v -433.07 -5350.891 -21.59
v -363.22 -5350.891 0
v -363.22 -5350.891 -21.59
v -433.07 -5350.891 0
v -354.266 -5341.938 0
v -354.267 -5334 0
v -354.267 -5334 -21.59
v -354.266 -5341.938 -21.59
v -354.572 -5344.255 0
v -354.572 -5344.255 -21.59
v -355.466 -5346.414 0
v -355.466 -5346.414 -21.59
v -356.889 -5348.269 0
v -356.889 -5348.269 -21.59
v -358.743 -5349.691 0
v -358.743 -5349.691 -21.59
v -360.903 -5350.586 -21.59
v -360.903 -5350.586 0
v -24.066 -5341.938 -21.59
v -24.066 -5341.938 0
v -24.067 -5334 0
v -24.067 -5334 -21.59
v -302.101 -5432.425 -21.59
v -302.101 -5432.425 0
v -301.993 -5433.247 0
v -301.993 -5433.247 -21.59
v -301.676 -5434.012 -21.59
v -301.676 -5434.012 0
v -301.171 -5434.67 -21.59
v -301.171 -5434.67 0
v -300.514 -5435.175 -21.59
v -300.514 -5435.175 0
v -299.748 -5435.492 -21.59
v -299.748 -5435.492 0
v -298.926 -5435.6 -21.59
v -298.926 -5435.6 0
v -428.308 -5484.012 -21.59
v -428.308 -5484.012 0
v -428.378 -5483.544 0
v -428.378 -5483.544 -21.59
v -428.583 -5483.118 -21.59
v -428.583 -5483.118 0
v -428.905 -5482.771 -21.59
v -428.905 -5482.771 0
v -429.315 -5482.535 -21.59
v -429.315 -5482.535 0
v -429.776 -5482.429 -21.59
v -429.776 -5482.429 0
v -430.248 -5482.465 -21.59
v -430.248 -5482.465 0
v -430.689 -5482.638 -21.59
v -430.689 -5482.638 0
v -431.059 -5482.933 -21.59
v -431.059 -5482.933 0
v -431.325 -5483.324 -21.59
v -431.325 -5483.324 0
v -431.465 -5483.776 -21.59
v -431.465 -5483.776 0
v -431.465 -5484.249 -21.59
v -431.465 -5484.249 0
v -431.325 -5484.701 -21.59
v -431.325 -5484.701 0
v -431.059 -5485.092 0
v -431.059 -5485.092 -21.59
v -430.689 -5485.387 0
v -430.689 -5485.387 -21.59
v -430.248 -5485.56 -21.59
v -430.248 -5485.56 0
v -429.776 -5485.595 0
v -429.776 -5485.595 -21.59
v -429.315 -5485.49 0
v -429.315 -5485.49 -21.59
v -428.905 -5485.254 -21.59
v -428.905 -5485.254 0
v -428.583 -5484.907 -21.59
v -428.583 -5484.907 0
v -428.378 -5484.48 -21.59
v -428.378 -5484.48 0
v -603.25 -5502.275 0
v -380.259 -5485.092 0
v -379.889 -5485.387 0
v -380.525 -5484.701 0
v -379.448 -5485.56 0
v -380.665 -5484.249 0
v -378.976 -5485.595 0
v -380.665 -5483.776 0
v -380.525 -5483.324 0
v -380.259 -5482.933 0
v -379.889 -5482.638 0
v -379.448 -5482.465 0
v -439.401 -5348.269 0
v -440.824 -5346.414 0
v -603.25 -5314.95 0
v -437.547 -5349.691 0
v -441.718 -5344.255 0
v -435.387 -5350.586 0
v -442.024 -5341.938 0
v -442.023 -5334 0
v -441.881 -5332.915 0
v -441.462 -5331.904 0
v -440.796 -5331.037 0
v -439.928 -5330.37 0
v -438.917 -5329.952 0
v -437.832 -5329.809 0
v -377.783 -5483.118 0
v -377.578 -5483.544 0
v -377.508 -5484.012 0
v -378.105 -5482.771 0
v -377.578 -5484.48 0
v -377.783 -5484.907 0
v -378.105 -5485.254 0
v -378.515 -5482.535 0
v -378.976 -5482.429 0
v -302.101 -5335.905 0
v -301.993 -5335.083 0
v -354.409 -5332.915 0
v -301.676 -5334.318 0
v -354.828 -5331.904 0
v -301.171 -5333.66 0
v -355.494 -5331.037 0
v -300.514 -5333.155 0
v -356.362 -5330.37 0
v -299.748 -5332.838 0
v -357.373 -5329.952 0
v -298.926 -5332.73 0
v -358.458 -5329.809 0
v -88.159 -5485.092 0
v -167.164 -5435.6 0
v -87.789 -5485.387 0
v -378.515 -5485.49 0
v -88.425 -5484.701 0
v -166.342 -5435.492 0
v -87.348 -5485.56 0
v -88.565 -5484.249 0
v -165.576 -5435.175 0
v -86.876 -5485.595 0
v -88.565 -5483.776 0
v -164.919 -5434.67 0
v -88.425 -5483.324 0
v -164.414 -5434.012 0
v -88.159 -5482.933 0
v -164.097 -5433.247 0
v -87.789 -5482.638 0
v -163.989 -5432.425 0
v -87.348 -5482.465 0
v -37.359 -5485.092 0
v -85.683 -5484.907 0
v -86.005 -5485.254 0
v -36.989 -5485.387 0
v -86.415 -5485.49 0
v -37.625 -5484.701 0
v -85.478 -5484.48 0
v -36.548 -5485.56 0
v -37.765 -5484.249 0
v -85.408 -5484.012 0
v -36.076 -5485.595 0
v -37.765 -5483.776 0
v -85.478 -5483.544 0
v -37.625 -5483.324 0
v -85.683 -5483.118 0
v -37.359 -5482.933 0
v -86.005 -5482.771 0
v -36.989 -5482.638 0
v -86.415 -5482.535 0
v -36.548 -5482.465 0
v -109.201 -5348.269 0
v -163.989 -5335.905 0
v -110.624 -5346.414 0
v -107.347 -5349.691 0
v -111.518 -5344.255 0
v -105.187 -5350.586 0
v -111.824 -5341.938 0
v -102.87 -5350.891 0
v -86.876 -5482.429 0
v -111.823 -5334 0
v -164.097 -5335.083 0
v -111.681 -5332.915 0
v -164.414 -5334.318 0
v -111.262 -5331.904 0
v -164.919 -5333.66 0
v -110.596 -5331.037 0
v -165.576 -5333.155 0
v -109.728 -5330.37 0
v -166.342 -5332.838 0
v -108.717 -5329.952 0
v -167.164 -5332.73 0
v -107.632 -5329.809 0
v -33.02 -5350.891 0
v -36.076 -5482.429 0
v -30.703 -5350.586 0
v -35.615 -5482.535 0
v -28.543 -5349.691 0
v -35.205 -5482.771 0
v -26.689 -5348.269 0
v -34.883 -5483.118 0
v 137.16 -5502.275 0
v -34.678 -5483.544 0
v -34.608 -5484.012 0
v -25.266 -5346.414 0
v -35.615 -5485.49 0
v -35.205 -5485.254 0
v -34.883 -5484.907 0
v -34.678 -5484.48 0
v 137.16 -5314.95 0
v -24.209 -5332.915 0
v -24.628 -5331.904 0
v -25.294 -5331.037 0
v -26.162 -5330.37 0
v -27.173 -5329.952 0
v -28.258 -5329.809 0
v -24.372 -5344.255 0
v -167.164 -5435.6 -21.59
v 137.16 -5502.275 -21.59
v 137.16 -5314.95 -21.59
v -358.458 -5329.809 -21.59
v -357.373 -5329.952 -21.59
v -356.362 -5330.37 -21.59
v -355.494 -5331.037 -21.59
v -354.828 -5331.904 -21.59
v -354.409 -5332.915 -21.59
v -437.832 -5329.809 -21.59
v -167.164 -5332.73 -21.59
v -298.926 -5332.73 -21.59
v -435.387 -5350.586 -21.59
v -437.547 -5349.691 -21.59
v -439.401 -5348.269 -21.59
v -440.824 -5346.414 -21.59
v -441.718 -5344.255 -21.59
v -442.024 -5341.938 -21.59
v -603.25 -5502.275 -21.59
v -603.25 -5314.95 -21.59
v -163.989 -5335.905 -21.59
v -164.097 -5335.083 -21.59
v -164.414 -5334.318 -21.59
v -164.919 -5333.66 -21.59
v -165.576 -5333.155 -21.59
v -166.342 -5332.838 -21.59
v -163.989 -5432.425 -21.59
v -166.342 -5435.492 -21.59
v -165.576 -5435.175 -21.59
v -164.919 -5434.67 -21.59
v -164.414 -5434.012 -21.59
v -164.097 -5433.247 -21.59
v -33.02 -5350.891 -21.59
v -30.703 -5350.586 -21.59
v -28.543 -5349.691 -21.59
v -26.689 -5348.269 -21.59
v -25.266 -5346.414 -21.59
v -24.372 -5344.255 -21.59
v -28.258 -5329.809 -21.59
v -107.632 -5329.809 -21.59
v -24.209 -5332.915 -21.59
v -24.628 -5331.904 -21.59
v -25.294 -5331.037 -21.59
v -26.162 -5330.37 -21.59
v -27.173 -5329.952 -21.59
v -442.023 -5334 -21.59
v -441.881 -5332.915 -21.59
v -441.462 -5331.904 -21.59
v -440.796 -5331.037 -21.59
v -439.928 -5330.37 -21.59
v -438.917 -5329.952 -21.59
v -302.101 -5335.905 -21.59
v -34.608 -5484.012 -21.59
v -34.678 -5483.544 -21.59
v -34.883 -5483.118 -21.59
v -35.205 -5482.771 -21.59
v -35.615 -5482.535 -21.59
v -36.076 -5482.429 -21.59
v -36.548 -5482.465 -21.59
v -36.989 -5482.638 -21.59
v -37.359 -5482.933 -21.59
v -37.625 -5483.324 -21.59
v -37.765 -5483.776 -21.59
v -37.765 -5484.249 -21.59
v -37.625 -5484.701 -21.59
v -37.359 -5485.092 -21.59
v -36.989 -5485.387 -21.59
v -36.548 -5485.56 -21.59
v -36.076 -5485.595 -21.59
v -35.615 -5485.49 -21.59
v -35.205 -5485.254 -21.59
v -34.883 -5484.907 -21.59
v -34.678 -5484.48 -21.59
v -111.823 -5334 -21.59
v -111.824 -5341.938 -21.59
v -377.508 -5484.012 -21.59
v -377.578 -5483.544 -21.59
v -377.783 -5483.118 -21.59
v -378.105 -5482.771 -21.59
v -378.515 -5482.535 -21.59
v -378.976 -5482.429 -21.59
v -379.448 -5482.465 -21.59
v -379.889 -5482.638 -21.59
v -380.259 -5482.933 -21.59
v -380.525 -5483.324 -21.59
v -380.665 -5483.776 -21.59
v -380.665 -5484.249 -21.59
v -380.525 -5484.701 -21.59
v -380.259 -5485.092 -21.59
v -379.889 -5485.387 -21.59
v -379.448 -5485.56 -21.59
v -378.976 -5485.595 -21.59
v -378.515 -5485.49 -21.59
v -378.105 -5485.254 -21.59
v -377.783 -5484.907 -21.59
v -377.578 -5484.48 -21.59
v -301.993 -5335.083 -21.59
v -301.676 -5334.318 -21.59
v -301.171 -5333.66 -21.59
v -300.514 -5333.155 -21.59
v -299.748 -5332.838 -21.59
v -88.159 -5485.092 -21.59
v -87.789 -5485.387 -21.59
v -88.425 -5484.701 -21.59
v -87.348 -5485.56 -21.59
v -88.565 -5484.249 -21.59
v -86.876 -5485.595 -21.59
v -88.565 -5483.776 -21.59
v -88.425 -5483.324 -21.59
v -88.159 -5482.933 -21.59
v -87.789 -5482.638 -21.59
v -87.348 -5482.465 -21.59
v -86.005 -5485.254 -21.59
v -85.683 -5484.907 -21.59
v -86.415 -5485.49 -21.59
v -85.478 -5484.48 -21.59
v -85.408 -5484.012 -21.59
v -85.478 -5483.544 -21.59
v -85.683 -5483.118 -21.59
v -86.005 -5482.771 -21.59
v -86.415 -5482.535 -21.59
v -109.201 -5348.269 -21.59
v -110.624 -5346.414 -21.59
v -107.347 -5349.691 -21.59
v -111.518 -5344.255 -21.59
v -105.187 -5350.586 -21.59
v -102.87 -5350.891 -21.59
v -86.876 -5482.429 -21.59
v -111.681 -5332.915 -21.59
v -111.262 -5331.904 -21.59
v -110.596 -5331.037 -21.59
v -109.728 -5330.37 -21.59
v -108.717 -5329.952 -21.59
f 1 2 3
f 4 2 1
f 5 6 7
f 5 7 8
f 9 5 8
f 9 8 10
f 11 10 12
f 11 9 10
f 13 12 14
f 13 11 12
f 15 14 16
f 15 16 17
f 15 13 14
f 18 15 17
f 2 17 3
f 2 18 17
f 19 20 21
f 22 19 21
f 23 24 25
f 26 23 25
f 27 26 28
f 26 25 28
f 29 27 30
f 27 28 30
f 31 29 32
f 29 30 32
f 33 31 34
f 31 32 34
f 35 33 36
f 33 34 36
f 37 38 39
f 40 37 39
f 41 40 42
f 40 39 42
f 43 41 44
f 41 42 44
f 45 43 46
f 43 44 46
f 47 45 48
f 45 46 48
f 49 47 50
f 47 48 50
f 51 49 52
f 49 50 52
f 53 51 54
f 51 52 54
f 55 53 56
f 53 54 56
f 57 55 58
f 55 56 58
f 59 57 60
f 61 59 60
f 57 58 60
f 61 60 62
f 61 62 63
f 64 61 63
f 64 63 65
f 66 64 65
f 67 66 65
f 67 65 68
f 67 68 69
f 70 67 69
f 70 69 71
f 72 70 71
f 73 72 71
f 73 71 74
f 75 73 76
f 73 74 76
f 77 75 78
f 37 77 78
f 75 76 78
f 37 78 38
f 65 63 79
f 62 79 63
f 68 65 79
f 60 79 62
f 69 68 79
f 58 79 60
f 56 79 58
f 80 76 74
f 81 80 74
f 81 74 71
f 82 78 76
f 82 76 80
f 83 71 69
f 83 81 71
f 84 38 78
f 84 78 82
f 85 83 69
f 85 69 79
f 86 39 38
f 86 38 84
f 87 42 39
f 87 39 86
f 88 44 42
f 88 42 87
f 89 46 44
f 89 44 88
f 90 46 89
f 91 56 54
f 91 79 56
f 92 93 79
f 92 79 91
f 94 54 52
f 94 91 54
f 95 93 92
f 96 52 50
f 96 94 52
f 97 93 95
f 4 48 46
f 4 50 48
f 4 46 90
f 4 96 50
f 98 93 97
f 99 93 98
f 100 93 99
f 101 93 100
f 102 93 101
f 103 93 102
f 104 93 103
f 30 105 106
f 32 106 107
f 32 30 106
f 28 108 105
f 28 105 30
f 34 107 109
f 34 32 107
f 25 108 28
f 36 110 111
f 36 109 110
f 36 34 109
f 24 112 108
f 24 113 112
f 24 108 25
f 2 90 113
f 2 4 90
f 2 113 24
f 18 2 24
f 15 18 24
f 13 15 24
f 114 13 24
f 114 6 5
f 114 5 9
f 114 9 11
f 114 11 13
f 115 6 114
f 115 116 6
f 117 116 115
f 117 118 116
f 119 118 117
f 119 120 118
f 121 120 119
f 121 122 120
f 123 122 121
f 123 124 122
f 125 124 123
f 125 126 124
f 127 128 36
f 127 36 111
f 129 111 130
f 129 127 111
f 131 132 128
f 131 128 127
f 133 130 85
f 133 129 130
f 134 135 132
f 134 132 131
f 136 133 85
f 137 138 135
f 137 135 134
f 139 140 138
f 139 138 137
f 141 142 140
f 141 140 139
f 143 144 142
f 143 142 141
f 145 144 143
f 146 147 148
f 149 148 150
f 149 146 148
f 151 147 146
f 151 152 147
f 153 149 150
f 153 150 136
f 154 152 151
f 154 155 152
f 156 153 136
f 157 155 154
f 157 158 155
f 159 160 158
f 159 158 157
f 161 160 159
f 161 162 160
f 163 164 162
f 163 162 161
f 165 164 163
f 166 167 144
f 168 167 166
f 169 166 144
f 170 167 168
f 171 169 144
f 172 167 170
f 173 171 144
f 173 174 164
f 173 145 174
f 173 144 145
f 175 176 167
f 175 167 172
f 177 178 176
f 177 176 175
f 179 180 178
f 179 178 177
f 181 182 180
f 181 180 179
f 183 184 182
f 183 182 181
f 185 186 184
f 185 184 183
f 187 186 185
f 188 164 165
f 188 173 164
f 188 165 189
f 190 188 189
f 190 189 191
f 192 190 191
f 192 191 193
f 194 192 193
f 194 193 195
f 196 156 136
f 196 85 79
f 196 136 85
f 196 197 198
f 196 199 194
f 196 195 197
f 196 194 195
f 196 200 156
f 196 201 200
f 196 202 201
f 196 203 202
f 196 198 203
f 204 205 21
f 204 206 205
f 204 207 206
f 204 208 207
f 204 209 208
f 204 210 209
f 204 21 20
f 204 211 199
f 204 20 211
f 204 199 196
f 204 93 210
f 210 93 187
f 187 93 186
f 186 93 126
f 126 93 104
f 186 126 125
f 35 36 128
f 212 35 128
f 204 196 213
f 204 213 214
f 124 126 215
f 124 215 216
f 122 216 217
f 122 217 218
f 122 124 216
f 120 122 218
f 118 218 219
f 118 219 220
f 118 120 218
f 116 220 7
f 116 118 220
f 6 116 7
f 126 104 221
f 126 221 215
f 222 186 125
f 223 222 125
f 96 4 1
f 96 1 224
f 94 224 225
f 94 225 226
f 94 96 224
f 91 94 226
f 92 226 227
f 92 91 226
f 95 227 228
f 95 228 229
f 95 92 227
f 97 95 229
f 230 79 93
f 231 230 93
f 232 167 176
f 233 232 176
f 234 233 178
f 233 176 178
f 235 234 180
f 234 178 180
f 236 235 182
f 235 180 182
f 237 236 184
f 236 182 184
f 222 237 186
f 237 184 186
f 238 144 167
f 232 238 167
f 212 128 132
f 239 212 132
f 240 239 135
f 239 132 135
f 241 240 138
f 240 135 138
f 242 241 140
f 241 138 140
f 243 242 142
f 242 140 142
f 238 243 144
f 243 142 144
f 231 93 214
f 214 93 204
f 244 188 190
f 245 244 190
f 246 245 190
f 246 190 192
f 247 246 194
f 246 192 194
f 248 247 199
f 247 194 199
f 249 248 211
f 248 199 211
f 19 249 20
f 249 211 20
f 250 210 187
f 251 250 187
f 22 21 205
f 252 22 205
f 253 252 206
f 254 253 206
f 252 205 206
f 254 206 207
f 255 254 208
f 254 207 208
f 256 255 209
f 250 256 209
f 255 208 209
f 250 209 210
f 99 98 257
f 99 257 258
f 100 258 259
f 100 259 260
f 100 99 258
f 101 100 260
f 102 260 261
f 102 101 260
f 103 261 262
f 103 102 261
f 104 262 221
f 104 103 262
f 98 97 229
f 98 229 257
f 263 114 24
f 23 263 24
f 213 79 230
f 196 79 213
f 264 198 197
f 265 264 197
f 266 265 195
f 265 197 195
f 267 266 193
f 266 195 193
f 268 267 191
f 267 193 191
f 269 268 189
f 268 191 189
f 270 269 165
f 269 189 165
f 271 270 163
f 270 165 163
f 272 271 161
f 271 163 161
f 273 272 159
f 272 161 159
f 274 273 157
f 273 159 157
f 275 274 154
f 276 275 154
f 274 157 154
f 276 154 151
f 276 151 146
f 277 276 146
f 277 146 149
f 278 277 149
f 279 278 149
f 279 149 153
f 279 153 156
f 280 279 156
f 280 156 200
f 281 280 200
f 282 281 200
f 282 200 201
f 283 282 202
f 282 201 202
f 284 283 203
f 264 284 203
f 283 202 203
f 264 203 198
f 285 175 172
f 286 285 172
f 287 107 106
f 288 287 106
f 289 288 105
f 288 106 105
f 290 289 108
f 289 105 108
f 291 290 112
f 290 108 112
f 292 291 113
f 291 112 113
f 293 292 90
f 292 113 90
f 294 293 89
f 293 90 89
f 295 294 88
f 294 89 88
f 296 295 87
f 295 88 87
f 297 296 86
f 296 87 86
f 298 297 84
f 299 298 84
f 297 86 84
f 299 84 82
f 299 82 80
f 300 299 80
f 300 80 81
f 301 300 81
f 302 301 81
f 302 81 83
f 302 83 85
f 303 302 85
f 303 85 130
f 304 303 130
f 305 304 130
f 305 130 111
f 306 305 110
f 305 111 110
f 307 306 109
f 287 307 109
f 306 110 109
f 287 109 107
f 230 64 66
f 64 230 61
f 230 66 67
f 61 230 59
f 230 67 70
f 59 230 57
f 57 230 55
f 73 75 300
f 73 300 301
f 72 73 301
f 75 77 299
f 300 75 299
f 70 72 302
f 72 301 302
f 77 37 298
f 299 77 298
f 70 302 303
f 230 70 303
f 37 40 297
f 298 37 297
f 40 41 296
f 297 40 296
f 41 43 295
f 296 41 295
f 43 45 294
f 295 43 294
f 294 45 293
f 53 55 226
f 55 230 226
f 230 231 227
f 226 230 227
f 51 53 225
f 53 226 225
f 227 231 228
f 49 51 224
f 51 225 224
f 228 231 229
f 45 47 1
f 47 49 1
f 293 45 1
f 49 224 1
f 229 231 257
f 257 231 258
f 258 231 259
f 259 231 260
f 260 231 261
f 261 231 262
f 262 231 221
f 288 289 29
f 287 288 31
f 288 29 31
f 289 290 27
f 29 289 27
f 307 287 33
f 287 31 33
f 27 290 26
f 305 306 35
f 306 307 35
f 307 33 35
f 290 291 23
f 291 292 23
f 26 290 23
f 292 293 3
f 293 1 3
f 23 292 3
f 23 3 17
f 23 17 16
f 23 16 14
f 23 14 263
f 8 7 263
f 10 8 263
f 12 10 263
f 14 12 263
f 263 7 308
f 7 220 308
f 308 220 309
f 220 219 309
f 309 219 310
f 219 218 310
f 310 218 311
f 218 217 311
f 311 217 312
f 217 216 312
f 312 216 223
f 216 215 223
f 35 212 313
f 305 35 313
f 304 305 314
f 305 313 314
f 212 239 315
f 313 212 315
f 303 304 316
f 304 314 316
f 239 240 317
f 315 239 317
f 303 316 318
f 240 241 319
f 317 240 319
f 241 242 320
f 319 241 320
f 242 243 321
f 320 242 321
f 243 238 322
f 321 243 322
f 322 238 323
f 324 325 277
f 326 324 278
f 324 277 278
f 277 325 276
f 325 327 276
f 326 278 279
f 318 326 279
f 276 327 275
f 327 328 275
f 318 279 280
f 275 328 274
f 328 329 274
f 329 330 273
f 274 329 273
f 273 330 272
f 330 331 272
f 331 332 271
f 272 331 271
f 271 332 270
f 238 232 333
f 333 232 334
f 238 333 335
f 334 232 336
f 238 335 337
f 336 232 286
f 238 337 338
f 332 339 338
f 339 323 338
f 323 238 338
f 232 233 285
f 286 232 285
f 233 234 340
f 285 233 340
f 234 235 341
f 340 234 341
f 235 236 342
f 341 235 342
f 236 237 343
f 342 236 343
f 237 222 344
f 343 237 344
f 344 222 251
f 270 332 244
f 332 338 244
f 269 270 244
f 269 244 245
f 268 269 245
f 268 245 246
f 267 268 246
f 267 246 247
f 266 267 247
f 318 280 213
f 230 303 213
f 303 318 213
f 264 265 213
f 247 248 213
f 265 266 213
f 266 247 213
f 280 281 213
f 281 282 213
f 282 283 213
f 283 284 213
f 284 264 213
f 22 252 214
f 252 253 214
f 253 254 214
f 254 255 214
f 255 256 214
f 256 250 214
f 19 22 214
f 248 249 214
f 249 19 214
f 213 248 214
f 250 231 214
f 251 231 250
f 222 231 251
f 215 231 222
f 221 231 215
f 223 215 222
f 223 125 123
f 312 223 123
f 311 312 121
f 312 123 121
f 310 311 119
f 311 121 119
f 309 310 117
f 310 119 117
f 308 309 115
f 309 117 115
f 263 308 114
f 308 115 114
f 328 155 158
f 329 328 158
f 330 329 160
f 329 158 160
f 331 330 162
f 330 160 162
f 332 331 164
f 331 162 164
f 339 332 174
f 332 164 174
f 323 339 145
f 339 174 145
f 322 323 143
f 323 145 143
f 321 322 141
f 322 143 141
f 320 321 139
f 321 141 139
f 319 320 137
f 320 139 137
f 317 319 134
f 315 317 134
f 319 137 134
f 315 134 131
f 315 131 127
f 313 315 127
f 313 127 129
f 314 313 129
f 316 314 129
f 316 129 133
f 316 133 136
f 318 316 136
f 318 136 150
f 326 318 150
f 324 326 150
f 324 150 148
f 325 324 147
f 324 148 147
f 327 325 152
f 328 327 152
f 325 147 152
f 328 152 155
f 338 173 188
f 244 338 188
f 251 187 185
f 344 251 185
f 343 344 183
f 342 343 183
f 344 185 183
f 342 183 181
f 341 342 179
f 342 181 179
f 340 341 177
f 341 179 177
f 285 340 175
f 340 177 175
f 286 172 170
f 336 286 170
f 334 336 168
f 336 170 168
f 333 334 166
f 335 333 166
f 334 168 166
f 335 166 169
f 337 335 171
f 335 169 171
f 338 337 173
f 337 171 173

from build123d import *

# Parameters (mm, degrees)
SKETCH2_W          = 740.41
SKETCH2_H          = 187.325
EXTRUDE1_DEPTH     = 21.59
SKETCH3_R          = 1.5875
CUT_EXTRUDE1_DEPTH = 21.59


with BuildPart() as part:
    # Sketch2 → Extrude1 (new body)
    with BuildSketch(Plane.XY):
        with Locations((-233.045, -5408.6125)):
            Rectangle(SKETCH2_W, SKETCH2_H)
    extrude(amount=-EXTRUDE1_DEPTH)

    # Sketch3 → Cut-Extrude1 (cut)
    with BuildSketch(Plane.XY):
        with Locations((-429.895, -5484.0124)):
            Circle(SKETCH3_R)
        with Locations((-379.095, -5484.0124)):
            Circle(SKETCH3_R)
        with Locations((-86.995, -5484.0124)):
            Circle(SKETCH3_R)
        with Locations((-36.195, -5484.0124)):
            Circle(SKETCH3_R)
        with BuildLine():
            Line((-302.10125, -5335.905), (-302.10125, -5432.425))
            ThreePointArc((-302.10125, -5432.425), (-301.17131403, -5434.67006403), (-298.92625, -5435.6))
            Line((-298.92625, -5435.6), (-167.16375, -5435.6))
            ThreePointArc((-167.16375, -5435.6), (-164.91868597, -5434.67006403), (-163.98875, -5432.425))
            Line((-163.98875, -5432.425), (-163.98875, -5335.905))
            ThreePointArc((-163.98875, -5335.905), (-164.91868597, -5333.65993597), (-167.16375, -5332.73))
            Line((-167.16375, -5332.73), (-298.92625, -5332.73))
            ThreePointArc((-298.92625, -5332.73), (-301.17131403, -5333.65993597), (-302.10125, -5335.905))
        make_face()
        with BuildLine():
            Line((-354.2665, -5334), (-354.2665, -5341.9375))
            ThreePointArc((-354.2665, -5341.9375), (-356.888919435, -5348.268580565), (-363.22, -5350.891))
            Line((-363.22, -5350.891), (-433.07, -5350.891))
            ThreePointArc((-433.07, -5350.891), (-439.401080565, -5348.268580565), (-442.0235, -5341.9375))
            Line((-442.0235, -5341.9375), (-442.0235, -5334))
            ThreePointArc((-442.0235, -5334), (-440.79598452, -5331.03651548), (-437.8325, -5329.809))
            Line((-437.8325, -5329.809), (-358.4575, -5329.809))
            ThreePointArc((-358.4575, -5329.809), (-355.49401548, -5331.03651548), (-354.2665, -5334))
        make_face()
        with BuildLine():
            Line((-102.87, -5350.891), (-33.02, -5350.891))
            ThreePointArc((-33.02, -5350.891), (-26.688919435, -5348.268580565), (-24.0665, -5341.9375))
            Line((-24.0665, -5341.9375), (-24.0665, -5334))
            ThreePointArc((-24.0665, -5334), (-25.29401548, -5331.03651548), (-28.2575, -5329.809))
            Line((-28.2575, -5329.809), (-107.6325, -5329.809))
            ThreePointArc((-107.6325, -5329.809), (-110.59598452, -5331.03651548), (-111.8235, -5334))
            Line((-111.8235, -5334), (-111.8235, -5341.9375))
            ThreePointArc((-111.8235, -5341.9375), (-109.201080565, -5348.268580565), (-102.87, -5350.891))
        make_face()
    extrude(amount=-CUT_EXTRUDE1_DEPTH, mode=Mode.SUBTRACT)


solid = part.part
